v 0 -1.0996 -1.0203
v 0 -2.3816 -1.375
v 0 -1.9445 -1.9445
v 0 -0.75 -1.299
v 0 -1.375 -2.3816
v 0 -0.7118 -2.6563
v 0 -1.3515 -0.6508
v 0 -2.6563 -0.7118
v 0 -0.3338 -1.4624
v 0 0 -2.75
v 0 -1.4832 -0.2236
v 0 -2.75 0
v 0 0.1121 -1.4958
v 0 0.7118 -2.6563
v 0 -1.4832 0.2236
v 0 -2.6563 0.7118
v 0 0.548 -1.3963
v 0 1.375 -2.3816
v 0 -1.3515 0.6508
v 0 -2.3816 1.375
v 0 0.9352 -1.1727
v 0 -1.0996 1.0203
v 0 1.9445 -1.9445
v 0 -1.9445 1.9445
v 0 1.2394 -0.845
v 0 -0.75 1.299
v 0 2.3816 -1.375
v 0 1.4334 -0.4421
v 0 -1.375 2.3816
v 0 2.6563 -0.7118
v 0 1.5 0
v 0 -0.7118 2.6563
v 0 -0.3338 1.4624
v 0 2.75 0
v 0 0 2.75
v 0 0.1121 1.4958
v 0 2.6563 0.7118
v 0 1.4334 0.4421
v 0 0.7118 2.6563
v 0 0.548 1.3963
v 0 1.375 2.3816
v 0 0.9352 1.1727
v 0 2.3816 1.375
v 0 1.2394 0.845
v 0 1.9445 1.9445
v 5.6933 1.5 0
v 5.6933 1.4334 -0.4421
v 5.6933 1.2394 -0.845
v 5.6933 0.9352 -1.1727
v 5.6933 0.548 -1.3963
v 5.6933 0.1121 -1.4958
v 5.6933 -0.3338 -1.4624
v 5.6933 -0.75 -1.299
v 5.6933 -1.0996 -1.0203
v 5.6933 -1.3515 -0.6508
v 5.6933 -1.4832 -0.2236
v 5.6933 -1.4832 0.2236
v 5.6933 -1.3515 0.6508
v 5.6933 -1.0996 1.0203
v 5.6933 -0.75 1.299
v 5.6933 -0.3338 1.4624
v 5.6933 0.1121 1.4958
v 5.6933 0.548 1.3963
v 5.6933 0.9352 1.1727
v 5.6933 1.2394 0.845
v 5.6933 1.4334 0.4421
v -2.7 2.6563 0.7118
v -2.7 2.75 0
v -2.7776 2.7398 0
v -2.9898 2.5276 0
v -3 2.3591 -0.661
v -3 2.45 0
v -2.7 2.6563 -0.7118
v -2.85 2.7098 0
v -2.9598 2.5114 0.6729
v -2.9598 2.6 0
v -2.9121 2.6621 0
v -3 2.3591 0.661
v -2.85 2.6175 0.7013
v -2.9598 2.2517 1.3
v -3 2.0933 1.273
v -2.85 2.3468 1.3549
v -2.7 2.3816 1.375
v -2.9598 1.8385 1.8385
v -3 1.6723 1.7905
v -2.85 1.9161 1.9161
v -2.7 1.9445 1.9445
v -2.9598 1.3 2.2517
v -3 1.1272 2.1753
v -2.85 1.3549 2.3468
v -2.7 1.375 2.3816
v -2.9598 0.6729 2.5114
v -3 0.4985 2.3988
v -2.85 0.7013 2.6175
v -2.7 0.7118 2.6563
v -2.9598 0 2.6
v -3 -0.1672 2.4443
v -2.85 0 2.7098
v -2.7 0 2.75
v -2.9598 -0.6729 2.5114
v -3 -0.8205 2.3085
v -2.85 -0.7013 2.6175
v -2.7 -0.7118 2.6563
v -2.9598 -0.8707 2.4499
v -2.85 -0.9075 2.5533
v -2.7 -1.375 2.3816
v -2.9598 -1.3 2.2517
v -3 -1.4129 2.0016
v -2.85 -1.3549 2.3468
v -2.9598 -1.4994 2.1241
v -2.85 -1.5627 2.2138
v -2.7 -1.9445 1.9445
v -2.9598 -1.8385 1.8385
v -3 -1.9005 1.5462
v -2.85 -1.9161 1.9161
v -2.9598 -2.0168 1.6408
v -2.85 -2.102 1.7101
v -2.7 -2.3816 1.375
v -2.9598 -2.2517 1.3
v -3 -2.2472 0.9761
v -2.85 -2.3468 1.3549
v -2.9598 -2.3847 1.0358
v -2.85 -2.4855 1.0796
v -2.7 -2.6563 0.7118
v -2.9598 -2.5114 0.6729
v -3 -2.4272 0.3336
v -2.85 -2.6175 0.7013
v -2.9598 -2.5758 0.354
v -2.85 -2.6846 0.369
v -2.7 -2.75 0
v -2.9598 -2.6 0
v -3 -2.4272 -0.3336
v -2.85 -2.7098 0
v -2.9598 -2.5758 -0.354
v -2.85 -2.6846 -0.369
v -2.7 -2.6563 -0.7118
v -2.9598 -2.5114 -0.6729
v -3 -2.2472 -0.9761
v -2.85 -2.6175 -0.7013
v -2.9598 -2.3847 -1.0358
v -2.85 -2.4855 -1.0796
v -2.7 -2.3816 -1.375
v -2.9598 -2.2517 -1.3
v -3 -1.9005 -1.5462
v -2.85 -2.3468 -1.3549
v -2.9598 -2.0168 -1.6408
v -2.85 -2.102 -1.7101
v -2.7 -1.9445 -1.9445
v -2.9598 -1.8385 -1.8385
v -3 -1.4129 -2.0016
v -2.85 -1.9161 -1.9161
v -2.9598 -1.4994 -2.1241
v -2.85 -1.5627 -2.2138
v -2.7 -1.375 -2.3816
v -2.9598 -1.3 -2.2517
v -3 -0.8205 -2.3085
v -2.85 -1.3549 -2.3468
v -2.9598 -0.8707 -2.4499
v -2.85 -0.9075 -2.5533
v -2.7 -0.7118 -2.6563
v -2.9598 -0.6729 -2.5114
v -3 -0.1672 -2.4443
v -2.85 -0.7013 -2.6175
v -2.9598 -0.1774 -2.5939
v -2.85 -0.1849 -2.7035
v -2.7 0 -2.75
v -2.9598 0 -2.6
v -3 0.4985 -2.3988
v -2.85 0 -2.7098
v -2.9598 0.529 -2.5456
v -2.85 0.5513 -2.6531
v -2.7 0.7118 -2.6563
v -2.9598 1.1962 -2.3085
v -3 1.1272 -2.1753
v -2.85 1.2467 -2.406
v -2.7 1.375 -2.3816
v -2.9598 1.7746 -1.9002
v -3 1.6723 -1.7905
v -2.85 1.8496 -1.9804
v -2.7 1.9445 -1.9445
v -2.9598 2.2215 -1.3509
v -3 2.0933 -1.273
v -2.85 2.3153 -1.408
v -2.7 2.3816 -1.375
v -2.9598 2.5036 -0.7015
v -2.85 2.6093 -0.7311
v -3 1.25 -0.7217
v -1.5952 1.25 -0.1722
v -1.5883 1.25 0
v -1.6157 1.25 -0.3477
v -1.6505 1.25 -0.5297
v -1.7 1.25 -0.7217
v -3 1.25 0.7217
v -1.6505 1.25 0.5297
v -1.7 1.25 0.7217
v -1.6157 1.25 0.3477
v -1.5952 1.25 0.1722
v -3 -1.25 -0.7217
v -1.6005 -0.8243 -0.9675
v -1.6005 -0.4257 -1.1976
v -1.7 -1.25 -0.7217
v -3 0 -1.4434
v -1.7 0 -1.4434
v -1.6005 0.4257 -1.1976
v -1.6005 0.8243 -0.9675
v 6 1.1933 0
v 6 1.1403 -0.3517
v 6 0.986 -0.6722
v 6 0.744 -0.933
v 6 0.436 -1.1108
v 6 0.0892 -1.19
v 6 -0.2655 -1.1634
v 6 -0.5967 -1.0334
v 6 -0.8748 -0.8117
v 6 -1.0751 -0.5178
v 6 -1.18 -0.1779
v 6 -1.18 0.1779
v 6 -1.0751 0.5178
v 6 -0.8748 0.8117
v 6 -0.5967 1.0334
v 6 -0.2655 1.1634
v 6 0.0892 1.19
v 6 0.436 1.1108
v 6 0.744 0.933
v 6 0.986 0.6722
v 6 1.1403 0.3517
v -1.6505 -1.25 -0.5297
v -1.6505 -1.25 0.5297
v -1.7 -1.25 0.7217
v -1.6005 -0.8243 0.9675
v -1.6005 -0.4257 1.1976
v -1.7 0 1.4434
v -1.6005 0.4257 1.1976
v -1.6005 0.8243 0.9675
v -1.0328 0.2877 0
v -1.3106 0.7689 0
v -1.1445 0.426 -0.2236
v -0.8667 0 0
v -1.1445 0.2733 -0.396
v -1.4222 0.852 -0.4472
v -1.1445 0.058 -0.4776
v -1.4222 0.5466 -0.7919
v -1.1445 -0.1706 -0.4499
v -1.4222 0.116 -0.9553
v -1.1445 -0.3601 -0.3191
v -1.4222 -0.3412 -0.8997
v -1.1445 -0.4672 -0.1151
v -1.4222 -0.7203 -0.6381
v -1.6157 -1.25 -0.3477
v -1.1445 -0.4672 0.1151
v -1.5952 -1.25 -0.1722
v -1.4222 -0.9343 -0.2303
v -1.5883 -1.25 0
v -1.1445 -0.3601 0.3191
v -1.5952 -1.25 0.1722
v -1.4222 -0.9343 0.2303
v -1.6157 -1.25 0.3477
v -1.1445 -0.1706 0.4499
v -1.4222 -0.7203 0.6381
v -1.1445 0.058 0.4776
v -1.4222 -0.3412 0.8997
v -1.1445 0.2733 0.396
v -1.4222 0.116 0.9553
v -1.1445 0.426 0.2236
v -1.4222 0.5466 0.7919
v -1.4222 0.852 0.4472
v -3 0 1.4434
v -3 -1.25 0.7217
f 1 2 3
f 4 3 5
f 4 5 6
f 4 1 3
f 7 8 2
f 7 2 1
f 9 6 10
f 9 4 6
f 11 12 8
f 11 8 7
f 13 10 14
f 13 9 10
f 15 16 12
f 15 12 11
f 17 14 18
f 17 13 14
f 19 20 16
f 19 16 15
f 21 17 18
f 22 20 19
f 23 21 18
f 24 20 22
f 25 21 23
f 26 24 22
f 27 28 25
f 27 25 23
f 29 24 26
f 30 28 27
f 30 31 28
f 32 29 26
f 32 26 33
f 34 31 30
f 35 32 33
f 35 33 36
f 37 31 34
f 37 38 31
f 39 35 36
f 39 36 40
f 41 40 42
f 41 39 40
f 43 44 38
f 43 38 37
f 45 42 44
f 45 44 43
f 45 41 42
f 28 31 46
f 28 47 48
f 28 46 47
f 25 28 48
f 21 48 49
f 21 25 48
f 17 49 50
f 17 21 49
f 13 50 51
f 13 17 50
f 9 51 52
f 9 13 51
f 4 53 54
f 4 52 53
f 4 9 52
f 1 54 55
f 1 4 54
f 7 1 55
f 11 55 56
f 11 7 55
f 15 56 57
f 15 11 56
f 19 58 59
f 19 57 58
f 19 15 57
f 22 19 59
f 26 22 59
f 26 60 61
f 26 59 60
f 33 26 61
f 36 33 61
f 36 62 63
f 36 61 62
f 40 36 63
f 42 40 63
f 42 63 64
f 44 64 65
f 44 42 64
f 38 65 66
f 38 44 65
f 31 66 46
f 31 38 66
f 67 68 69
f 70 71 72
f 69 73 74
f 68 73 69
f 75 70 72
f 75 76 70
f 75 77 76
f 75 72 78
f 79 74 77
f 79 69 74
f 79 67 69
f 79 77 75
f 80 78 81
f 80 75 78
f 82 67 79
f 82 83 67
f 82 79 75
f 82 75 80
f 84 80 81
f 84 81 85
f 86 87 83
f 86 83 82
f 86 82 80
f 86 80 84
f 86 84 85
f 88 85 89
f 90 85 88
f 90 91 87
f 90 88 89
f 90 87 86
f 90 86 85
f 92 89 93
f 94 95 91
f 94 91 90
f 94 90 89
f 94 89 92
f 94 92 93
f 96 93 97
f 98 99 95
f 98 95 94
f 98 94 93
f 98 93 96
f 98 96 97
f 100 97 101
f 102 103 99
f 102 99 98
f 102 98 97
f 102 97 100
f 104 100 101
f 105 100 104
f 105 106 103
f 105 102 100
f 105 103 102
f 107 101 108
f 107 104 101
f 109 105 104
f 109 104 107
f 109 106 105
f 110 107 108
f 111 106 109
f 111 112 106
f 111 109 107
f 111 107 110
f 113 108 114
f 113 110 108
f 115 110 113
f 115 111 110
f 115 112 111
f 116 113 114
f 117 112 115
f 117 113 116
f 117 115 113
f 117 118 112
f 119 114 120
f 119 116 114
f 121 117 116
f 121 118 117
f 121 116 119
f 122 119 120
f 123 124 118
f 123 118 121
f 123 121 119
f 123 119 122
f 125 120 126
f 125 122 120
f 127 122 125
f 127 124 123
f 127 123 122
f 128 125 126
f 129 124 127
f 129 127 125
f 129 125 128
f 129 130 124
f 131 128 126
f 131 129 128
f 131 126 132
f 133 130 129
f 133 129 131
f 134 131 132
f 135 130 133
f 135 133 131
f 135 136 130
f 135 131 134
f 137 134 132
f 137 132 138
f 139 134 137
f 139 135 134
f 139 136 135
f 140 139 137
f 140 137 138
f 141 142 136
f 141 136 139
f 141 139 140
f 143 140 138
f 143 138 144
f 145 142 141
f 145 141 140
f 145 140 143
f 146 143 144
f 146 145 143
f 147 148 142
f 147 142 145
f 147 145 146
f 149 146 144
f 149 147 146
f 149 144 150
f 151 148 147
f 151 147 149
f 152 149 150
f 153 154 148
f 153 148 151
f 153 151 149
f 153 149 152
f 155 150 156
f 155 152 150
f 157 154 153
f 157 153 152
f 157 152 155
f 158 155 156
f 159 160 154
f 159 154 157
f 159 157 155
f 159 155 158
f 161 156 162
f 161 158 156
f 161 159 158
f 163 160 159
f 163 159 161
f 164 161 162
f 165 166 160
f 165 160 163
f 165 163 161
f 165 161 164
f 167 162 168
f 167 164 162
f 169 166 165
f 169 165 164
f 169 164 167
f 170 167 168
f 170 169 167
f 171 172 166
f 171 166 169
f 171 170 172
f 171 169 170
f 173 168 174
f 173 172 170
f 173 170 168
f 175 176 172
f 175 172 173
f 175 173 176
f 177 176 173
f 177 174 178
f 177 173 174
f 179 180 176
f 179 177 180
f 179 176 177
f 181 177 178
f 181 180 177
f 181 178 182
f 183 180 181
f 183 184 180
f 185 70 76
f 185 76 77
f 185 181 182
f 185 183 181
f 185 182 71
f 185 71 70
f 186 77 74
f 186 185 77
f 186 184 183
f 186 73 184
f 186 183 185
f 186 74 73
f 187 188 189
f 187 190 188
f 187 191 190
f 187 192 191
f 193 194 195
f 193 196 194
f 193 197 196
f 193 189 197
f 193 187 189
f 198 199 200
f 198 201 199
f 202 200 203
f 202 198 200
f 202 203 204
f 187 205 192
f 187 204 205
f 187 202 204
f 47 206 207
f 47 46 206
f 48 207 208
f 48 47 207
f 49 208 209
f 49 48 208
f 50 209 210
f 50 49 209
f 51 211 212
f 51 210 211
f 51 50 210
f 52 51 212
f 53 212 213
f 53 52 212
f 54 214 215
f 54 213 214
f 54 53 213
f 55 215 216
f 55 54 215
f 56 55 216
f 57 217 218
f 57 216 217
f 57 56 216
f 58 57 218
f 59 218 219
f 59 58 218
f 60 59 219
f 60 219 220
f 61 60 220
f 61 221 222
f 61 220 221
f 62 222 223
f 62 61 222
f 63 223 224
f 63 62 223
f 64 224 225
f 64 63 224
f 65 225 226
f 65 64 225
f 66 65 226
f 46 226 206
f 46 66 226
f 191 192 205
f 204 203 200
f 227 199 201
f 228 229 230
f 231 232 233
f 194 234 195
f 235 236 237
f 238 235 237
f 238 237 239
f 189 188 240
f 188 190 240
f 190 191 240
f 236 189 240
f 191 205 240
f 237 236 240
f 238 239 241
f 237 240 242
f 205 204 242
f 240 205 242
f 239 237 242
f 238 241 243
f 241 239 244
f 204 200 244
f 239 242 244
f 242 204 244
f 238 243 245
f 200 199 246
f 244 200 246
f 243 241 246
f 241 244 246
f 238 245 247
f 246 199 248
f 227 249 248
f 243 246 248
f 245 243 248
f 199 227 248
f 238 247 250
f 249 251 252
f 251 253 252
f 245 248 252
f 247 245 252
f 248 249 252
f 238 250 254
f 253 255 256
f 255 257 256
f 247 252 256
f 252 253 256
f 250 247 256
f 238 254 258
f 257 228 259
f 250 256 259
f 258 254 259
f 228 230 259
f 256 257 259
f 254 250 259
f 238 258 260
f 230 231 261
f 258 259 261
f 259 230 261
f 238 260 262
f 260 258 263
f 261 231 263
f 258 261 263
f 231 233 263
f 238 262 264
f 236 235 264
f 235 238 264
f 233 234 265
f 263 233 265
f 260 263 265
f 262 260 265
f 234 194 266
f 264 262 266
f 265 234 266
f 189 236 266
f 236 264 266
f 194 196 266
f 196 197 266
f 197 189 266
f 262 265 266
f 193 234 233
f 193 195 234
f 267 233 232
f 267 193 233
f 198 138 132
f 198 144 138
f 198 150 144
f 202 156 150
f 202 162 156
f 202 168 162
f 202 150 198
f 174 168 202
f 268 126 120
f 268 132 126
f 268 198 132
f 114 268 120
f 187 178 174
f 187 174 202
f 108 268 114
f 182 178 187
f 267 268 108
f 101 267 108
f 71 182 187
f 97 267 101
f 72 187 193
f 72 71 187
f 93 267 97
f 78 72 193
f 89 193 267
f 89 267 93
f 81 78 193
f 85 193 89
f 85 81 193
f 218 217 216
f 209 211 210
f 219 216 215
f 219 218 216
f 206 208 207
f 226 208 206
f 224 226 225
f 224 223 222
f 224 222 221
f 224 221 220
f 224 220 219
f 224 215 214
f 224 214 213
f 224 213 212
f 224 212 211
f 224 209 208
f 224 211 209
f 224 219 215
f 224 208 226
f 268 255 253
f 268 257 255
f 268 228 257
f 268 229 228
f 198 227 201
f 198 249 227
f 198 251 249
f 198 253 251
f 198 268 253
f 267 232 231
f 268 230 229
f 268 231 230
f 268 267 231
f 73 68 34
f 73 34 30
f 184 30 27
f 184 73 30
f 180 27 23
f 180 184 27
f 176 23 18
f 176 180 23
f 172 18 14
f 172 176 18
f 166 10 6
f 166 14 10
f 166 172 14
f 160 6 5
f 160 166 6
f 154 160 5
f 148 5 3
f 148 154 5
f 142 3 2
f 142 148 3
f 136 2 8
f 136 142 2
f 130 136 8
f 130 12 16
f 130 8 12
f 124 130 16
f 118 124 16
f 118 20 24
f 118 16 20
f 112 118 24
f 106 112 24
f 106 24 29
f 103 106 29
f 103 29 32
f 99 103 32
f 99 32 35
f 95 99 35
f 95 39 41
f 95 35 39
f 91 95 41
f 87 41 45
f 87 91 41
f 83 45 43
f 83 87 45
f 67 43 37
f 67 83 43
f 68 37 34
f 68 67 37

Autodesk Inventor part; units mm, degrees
ref_plane "YZ Plane" through (0, 0, 0) normal (1, 0, 0) x (0, 1, 0)
ref_plane "XZ Plane" through (0, 0, 0) normal (0, 1, 0) x (-1, 0, 0)
ref_plane "XY Plane" through (0, 0, 0) normal (0, 0, 1) x (1, 0, 0)
sketch "Skizze1" plane through (0, 0, 0) normal (0, 0, 1) x (1, 0, 0)
  line L0 (-0.8667, 0) -> (6, 0)
  line L1 (6, 0) -> (6, 1.5)
  line L2 (6, 1.5) -> (1.25, 1.5)
  line L3 (1.25, 1.5) -> (0.9432, 1.5)
  line L4 (0.9432, 1.5) -> (0, 1.5)
  line L5 (0, 1.5) -> (0, 2.75)
  line L6 (0, 2.75) -> (-3, 2.75)
  line L7 (-3, 2.75) -> (-3, 1.4434)
  line L8 (-3, 1.4434) -> (-1.7, 1.4434)
  line L9 (-1.7, 1.4434) -> (-0.8667, 0)
  line L10 (-15.5, 0) -> (61.5, 0) projected
  line L11 (0, -0.8) -> (0, 10.4) projected
  line L12 (1.25, 1.5) -> (0, 1.5) construction
  dimension "d1" = 4.75
  dimension "d2" = 0.3068
  dimension "d3" = 3
  dimension "d4" = 1.3
  dimension "d5" = 60
  dimension "d6" = 3
  dimension "d7" = 3
  dimension "d8" = 2.8868
  dimension "d9" = 5.5
  dimension "d26" = 6
revolve "Körper" add sketch "Skizze1" angle 360 about axis through (-0.8667, 0, 0) along (1, 0, 0)
sketch "Skizze2" plane through (-3, 0, 0) normal (-1, 0, 0) x (0, 0, 1)
  circle A0 centre (0, 0) radius 1.4434 projected
  line L0 (0, -3.3) -> (0, 4.4) projected
  line L1 (-3.3, 0) -> (4.4, 0) projected
  line L2 (1.4434, 0) -> (0.7217, -1.25)
  line L3 (0.7217, -1.25) -> (-0.7217, -1.25)
  line L4 (-0.7217, -1.25) -> (-1.4434, 0)
  line L5 (-1.4434, 0) -> (-0.7217, 1.25)
  line L6 (-0.7217, 1.25) -> (0.7217, 1.25)
  line L7 (0.7217, 1.25) -> (1.4434, 0)
extrude "Loch" add sketch "Skizze2" against normal up to next contours L7 A0 | A0 L2 | L6 L0 A0 | A0 L0 L3 | L0 L6 A0 | A0 L3 L0 | L4 A0 | A0 L5
fillet "Rundung1" radius 0.3 1 edges at (-3, -2.75, 0)
thread "Gewinde" size "M3x0.5" designation "M3" class "6g" standard "ANSI Metrisches M Profil" length 4.75
chamfer "Fase1" distance 0.3067 distance2 0.3067 1 edges at (6, -1.5, 0) measured on face at (6, -0.2617, -0.7882)
equation "\"d1\" = GEL"
equation "\"d3\" = KOH"
equation "\"d4\" = INTI"
equation "\"d6\" = GD"
equation "\"d7\" = BDM"
equation "\"d8\" = 1.1547 * SW"
equation "\"d9\" = KOD"
equation "\"d26\" = NLG"
equation "\"d17\" = RR"
equation "\"d13\" = GEL"
equation "\"d15\" = -0.5 * SPD + 0.5 * GD"
equation "\"d16\" = GUL"
equation "\"GD\" = NND"
equation "\"NLG\" = 6"
equation "\"GEL\" = 4.75"
equation "\"KOD\" = 5.5"
equation "\"KOH\" = 3"
equation "\"INTI\" = 1.3"
equation "\"GAL\" = 0.61345 * TPU"
equation "\"GUL\" = 0.61345 * TPU"
equation "\"BDM\" = NND"
equation "\"SW\" = 2.5"
equation "\"RR\" = 0.1 * KOH"
equation "\"SPD\" = NND - 1.2269 * TPU"
equation "\"NND\" = 3"
equation "\"E0\" = 1.155 * SW"
equation "\"ANG\" = 120deg"
equation "\"FAWI\" = 45deg"
equation "\"THREADDIA\" = 3"
equation "\"TPU\" = 0.5"
equation "\"GD1\" = THREADDIA - 1.2269 * TPU"
equation "\"PTC\" = TPU"
equation "\"TOA\" = 30deg"
properties part number "520204172"
